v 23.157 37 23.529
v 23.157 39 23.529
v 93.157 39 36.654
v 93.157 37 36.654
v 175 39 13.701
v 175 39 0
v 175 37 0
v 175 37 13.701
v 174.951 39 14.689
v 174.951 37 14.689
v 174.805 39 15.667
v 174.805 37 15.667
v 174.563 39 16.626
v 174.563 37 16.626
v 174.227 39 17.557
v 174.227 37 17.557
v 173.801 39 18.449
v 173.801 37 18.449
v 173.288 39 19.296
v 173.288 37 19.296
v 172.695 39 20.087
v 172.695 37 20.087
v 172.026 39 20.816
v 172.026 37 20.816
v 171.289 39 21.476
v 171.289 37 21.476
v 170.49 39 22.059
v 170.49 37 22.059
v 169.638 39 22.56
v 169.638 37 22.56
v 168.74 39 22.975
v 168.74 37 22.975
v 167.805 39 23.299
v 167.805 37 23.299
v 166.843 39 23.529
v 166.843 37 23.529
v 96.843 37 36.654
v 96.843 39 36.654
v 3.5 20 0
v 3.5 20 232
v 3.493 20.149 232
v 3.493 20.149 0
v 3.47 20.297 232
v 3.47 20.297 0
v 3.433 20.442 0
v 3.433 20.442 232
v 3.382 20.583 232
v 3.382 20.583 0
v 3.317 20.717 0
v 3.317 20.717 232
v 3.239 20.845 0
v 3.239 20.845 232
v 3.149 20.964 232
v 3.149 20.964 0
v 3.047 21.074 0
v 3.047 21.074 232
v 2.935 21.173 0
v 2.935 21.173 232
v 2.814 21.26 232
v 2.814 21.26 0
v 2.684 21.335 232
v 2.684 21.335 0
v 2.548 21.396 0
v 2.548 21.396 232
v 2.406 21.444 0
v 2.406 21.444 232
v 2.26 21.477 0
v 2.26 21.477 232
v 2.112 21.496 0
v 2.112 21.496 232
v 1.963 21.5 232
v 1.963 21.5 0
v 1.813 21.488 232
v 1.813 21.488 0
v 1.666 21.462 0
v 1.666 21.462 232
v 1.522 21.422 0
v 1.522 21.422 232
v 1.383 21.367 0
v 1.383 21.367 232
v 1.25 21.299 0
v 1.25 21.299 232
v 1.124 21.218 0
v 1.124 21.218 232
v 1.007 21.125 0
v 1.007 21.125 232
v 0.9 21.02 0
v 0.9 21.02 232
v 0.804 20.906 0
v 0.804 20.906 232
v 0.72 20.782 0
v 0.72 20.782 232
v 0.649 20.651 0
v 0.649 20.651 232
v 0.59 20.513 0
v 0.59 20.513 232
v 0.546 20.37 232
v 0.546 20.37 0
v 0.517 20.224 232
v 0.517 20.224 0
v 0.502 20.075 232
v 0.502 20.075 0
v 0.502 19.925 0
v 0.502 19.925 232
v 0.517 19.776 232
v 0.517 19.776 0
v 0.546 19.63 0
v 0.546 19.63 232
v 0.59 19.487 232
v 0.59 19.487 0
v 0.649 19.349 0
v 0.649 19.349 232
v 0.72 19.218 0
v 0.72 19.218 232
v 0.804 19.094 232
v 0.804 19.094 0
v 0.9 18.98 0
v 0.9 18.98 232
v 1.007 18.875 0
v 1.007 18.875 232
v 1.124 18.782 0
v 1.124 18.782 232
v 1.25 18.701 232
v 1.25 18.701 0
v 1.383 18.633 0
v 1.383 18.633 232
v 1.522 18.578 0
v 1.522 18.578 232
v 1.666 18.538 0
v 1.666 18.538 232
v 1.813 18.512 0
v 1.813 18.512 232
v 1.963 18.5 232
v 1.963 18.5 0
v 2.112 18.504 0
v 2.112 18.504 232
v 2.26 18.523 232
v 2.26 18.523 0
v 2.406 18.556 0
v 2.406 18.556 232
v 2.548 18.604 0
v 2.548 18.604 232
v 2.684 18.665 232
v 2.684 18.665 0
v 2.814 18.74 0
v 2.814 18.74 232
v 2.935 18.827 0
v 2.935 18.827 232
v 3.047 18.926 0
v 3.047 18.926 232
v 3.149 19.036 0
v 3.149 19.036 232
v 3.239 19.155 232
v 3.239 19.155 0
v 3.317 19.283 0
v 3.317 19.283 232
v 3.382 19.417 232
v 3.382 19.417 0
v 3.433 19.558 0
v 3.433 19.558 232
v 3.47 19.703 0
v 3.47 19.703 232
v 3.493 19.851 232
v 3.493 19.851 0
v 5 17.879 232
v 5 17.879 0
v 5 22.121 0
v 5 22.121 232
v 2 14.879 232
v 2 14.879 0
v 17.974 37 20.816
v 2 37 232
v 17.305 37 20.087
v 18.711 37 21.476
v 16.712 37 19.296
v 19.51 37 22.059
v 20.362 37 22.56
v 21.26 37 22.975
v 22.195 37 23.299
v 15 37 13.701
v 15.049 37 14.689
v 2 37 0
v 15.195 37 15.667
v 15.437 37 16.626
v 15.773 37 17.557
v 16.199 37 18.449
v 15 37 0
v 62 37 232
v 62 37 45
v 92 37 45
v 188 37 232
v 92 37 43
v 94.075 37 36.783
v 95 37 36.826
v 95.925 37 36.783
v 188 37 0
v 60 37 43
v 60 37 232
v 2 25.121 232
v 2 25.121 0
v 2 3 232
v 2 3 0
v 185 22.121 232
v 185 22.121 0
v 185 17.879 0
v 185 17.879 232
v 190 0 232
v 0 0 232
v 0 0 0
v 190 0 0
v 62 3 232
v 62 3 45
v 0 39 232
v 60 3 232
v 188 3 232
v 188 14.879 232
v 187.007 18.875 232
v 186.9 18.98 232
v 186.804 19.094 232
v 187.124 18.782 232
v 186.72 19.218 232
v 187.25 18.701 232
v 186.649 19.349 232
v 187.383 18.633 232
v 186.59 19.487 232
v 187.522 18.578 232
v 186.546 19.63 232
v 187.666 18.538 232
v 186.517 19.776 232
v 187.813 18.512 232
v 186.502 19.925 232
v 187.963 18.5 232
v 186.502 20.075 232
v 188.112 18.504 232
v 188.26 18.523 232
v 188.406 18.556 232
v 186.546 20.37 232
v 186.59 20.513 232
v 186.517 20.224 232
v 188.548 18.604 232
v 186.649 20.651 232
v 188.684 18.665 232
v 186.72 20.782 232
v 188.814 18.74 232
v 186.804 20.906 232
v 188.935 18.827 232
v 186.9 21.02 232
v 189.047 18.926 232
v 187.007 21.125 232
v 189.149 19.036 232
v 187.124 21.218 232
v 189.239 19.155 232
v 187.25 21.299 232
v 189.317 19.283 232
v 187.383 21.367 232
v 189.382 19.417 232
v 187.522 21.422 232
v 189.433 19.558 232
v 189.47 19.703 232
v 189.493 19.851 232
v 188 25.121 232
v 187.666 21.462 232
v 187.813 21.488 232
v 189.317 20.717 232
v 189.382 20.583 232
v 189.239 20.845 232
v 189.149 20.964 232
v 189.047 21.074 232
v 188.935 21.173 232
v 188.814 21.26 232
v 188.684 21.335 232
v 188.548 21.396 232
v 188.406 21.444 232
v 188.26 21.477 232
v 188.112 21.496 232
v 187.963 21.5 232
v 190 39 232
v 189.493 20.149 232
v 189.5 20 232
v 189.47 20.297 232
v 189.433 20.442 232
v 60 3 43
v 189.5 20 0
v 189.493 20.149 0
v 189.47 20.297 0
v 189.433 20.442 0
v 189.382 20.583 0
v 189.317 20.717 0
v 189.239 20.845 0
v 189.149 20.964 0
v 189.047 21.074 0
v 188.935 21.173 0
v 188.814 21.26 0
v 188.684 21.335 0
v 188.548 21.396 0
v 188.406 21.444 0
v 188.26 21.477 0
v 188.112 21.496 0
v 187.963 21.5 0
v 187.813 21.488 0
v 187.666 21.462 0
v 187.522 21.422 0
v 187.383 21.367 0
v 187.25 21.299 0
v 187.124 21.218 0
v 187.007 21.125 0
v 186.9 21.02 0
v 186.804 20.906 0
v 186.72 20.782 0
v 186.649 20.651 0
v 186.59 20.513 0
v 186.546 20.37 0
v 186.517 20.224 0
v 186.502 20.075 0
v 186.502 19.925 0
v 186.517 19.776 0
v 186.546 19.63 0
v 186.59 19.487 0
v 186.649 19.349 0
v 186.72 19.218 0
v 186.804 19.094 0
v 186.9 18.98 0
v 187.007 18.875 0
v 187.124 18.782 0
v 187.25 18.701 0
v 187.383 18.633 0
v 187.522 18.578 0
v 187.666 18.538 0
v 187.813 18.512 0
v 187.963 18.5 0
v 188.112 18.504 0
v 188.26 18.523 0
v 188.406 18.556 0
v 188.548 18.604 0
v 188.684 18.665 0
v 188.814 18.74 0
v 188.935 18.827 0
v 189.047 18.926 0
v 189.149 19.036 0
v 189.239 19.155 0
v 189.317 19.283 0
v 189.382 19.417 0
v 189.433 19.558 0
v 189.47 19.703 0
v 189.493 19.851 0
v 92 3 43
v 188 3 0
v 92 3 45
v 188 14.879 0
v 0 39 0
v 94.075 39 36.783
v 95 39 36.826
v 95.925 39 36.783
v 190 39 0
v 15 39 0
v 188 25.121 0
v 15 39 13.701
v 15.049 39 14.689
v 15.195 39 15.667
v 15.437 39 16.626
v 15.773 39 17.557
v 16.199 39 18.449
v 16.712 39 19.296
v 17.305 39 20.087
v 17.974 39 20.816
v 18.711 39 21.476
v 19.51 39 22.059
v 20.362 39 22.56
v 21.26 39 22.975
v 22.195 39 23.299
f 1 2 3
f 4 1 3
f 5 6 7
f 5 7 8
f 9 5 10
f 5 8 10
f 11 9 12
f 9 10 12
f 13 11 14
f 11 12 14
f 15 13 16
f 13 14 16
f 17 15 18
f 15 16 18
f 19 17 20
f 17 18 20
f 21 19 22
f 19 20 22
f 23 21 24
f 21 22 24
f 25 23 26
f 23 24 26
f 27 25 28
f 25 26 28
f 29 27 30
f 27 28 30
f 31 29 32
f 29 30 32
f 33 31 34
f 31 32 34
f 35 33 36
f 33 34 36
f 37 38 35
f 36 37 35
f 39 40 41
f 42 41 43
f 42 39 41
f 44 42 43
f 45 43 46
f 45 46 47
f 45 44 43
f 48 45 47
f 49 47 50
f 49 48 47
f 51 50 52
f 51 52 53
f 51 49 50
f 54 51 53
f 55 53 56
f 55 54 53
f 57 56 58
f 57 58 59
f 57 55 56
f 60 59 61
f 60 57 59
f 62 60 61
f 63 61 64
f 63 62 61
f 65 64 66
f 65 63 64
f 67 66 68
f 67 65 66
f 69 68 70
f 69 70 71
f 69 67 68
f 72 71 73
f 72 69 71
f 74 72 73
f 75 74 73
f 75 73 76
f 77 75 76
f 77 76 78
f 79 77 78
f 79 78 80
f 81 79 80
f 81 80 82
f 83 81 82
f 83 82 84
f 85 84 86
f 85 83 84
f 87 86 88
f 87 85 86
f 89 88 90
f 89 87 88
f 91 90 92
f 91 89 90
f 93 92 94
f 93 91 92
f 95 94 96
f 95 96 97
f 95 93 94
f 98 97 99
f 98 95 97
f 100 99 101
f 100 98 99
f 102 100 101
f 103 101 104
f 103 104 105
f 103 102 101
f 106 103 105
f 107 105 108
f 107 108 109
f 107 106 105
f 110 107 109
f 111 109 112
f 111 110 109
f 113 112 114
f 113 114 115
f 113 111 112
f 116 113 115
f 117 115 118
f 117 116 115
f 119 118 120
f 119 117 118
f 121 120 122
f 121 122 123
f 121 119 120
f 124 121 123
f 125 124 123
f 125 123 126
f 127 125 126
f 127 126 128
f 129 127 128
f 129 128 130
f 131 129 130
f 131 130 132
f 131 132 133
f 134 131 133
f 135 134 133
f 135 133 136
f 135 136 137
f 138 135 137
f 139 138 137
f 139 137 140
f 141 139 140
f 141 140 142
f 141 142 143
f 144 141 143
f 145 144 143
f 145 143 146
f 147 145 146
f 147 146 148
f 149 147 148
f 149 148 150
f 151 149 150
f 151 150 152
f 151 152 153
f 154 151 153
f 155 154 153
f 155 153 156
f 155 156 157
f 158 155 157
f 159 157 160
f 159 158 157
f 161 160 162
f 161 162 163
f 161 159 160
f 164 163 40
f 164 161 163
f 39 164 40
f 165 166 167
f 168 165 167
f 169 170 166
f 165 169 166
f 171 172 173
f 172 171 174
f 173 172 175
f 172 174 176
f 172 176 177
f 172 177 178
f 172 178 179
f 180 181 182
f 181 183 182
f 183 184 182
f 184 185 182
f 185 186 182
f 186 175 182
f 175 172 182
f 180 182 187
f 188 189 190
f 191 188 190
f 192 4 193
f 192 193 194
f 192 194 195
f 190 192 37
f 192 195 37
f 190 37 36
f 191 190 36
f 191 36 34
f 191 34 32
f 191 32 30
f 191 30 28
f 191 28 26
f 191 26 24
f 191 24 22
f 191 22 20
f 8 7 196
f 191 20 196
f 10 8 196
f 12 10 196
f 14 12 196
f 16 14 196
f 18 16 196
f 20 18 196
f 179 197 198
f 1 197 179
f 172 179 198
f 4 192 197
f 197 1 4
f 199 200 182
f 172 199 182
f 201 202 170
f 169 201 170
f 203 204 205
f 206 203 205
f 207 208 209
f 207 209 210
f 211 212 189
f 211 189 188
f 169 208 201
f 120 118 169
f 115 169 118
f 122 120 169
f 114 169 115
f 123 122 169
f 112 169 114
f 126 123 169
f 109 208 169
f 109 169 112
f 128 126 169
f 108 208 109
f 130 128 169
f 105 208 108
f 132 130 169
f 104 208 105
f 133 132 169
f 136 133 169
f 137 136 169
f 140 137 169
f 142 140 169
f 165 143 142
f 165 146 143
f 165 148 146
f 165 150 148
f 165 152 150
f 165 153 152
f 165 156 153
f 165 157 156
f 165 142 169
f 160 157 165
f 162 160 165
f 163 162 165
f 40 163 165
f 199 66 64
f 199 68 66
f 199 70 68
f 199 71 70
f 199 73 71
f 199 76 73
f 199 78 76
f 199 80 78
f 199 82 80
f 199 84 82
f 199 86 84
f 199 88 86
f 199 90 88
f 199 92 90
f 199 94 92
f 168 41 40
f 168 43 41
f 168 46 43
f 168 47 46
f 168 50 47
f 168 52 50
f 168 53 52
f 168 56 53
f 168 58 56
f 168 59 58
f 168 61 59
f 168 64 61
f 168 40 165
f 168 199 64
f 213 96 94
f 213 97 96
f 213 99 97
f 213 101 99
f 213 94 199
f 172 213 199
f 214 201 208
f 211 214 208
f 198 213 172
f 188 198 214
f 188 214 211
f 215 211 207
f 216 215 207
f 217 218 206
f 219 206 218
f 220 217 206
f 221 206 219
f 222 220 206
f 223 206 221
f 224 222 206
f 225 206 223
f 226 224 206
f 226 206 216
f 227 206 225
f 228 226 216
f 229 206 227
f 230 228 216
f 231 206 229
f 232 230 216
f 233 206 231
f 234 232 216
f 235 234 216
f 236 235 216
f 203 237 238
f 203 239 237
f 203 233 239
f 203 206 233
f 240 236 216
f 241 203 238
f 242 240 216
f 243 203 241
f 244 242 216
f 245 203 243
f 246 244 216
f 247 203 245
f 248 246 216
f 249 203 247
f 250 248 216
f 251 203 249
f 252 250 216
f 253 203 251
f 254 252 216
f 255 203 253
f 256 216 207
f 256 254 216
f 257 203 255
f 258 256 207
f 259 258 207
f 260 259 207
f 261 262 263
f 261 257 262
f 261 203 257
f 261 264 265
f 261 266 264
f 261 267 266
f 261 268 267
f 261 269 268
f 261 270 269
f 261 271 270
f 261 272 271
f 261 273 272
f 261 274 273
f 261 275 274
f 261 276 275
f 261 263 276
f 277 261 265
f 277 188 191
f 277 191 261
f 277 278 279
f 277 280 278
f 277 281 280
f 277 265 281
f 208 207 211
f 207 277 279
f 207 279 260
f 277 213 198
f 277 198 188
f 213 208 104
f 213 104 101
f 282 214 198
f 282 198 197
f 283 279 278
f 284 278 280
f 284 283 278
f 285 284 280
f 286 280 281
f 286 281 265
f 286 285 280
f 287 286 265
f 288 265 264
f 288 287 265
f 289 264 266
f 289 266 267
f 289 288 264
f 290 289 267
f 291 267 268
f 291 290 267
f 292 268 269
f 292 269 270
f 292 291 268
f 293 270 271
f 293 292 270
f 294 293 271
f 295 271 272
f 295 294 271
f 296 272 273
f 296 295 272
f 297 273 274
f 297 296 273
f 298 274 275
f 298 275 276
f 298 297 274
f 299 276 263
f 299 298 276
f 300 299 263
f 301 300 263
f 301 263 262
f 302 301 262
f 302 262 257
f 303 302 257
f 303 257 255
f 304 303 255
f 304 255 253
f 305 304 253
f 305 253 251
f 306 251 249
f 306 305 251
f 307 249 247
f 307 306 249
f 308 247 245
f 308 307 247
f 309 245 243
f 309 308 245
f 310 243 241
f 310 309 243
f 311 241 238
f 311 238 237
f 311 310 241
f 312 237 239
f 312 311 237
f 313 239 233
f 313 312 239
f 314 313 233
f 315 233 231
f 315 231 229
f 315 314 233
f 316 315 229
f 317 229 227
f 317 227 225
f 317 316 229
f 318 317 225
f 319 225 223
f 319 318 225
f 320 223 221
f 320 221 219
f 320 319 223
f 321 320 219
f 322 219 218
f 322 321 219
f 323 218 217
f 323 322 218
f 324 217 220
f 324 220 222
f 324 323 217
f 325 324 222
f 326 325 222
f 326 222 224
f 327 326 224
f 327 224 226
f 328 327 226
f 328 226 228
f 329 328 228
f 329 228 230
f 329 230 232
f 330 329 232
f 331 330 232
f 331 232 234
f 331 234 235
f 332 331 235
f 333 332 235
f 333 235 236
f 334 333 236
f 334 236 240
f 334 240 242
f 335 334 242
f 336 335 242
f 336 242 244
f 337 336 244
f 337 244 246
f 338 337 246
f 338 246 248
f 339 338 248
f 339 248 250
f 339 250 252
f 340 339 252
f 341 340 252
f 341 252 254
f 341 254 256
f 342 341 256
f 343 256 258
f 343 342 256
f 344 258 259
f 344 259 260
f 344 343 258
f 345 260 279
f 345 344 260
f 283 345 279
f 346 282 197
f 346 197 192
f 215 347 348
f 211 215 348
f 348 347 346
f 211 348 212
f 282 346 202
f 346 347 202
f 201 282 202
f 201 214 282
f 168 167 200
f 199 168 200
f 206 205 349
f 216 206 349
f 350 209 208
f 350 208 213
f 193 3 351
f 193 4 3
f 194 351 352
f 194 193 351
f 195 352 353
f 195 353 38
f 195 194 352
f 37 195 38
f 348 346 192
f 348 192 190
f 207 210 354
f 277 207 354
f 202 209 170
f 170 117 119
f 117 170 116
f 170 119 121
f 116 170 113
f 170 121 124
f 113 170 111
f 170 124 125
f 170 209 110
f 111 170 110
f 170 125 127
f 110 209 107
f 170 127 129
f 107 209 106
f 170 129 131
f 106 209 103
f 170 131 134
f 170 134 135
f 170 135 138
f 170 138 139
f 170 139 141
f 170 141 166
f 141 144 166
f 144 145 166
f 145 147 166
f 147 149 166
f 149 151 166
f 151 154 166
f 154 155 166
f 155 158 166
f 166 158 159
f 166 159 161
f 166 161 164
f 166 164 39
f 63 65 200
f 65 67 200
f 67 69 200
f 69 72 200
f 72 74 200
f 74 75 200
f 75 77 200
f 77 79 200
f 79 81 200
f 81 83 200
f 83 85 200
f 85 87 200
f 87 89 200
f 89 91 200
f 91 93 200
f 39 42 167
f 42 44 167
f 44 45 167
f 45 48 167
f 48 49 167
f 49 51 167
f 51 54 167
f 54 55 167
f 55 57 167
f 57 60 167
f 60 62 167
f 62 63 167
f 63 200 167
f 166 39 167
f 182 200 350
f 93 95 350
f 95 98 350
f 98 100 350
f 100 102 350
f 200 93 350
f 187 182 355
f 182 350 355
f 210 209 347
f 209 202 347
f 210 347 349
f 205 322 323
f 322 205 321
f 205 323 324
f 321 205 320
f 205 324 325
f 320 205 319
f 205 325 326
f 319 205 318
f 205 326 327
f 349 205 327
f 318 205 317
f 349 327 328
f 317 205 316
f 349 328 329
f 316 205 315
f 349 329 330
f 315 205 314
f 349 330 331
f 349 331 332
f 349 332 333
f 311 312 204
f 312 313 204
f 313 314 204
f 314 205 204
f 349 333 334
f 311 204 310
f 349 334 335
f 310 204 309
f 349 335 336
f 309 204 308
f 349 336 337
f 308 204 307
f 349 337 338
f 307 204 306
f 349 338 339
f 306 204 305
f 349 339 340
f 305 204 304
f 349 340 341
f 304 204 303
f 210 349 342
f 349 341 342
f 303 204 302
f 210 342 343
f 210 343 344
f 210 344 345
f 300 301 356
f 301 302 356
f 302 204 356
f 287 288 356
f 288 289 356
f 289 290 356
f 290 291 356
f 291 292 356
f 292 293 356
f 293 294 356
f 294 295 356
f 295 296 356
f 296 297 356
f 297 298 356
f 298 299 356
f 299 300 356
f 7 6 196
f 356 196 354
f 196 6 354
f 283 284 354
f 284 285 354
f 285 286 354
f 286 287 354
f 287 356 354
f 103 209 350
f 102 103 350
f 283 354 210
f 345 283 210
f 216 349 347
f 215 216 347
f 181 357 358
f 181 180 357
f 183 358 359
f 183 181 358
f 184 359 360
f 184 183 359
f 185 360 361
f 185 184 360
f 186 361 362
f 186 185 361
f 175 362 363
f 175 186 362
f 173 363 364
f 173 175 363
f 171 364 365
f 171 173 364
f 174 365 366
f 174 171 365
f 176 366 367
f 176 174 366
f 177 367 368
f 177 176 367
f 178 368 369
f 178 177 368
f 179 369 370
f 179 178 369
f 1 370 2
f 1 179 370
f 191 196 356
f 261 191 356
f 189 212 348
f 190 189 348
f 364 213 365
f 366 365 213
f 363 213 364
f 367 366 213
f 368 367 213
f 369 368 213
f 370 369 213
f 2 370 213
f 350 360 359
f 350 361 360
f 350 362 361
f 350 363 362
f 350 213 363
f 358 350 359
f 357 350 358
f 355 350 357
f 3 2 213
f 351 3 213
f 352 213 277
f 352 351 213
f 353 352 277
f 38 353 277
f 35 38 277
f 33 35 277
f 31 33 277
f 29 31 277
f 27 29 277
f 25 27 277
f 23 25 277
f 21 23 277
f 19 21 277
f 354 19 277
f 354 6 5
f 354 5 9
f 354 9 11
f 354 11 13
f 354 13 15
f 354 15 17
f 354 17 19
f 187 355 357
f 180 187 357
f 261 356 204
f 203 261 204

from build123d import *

# Parameters (mm, degrees)
F0_W     = 190
F0_H     = 39
F0_R     = 1.5
F1_DEPTH = 232
F2_W     = 2
F2_H     = 187
F2_H_2   = 2
F2_W_2   = 30
F3_DEPTH = 39
F4_W     = 160
F4_H     = 22
F5_DEPTH = 5
F6_R     = 10


with BuildPart() as f1:
    # F0 (on Top) → F1 (new body)
    with BuildSketch(Plane.XY):
        with Locations((95, 19.5)):
            Rectangle(F0_W, F0_H)
        with Locations((2, 20)):
            Circle(F0_R, mode=Mode.SUBTRACT)
        Polygon((188, 3), (2, 3), (2, 14.8786796564), (5, 17.8786796564), (5, 22.1213203436), (2, 25.1213203436), (2, 37), (188, 37), (188, 25.1213203436), (185, 22.1213203436), (185, 17.8786796564), (188, 14.8786796564), align=None, mode=Mode.SUBTRACT)
        with Locations((188, 20)):
            Circle(F0_R, mode=Mode.SUBTRACT)
    extrude(amount=F1_DEPTH)

    # F2 (on face) → F3 (join)
    with BuildSketch(Plane.XZ):
        with Locations((61, 138.5)):
            Rectangle(F2_W, F2_H)
        with Locations((61, 44)):
            Rectangle(F2_W, F2_H_2)
        with Locations((77, 44)):
            Rectangle(F2_W_2, F2_H_2)
    extrude(amount=-F3_DEPTH)

    # F4 (on face) → F5 (cut)
    with BuildSketch(Plane(origin=(0, 39, 0), x_dir=(-1, 0, 0), z_dir=(0, 1, 0))):
        Polygon((-95, 37), (-175, 22), (-15, 22), align=None)
        with Locations((-95, 11)):
            Rectangle(F4_W, F4_H)
    extrude(amount=-F5_DEPTH, mode=Mode.SUBTRACT)

    # F6
    f6_edges = [f1.edges().sort_by_distance(p)[0] for p in [
        (175, 38, 22),
        (15, 38, 22),
        (95, 38, 37),
    ]]
    fillet(f6_edges, radius=F6_R)


solid = f1.part
